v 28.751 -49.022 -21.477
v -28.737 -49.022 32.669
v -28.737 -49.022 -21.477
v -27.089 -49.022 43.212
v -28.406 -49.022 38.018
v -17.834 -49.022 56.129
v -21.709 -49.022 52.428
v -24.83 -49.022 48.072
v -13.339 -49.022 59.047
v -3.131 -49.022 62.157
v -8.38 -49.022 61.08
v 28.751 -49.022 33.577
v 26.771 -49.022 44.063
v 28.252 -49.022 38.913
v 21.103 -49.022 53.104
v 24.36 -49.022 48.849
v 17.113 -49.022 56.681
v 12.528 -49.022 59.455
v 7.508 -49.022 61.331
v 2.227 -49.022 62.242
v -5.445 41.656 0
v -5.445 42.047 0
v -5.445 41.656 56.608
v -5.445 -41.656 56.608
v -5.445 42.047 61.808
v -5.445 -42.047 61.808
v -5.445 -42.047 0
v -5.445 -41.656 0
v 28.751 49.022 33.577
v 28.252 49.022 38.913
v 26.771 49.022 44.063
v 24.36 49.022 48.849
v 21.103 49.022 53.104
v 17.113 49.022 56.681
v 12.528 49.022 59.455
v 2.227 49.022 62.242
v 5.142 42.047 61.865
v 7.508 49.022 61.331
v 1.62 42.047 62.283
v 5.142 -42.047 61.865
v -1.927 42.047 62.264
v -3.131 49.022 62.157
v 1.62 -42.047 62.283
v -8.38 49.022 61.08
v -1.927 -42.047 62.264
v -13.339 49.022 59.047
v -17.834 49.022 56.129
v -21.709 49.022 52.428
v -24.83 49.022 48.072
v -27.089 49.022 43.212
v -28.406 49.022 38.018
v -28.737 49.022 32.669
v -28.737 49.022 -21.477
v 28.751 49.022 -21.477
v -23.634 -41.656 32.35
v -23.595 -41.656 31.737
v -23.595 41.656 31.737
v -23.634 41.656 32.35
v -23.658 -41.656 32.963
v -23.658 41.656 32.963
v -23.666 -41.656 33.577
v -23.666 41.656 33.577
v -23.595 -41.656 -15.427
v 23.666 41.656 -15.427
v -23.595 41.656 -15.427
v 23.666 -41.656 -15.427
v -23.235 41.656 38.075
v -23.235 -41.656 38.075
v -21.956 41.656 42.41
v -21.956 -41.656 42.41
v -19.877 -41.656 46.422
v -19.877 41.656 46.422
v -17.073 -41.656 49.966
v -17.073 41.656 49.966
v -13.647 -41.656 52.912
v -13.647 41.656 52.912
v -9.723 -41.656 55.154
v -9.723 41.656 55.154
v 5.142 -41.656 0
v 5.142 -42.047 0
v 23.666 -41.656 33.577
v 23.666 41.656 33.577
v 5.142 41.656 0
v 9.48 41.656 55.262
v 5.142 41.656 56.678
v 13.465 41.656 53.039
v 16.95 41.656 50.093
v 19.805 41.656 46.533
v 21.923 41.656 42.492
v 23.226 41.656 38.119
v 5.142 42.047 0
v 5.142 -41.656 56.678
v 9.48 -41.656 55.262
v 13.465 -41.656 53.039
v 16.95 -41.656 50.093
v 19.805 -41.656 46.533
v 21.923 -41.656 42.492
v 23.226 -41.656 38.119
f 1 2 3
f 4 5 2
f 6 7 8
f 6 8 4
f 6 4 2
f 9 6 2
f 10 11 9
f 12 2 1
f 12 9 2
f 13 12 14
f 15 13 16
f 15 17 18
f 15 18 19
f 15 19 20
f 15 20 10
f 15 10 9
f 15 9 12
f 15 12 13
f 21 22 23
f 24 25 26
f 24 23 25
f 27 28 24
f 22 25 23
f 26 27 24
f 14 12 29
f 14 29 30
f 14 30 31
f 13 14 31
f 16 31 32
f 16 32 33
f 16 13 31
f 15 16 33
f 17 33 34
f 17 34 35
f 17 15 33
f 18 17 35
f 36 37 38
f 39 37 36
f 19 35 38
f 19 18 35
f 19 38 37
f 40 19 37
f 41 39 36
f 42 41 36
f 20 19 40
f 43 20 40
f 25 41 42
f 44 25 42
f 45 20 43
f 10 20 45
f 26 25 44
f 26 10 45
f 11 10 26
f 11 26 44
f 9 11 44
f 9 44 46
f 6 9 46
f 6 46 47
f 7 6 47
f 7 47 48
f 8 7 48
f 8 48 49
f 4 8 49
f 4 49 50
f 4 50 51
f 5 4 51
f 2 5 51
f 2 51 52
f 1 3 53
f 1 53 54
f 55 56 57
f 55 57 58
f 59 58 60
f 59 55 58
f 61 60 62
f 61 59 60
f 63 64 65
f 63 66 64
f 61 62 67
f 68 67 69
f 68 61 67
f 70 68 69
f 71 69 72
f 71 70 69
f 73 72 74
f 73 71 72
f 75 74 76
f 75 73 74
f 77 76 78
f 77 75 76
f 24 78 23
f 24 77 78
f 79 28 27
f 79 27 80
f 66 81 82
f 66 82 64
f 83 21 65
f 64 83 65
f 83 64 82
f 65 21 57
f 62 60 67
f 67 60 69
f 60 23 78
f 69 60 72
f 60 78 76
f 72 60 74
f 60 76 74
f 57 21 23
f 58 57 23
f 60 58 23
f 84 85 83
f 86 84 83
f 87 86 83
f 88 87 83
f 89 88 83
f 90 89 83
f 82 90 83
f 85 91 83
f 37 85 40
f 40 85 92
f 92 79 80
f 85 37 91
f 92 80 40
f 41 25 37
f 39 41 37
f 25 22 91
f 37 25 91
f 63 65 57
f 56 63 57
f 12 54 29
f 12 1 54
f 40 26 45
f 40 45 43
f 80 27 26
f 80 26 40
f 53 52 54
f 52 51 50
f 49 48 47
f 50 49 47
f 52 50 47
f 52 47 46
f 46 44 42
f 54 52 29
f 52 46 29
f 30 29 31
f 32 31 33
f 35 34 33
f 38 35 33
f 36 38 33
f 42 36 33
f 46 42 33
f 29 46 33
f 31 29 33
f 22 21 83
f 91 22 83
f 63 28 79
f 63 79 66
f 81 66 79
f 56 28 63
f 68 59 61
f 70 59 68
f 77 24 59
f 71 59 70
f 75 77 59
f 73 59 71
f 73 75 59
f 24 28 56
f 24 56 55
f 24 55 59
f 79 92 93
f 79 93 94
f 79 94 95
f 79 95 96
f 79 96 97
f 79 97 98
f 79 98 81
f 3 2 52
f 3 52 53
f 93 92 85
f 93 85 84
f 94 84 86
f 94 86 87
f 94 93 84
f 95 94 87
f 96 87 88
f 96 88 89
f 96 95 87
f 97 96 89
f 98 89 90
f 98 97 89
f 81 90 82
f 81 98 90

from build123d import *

# Parameters (mm, degrees)
F1_DEPTH = 49.022
F3_DEPTH = 41.656
F4_W     = 10.587335
F4_H     = 42.046845
F5_DEPTH = 108.712


with BuildPart() as f1:
    # F0 (on Front) → F1 (new body)
    with BuildSketch(Plane.XZ):
        with BuildLine():
            Line((-28.737051, 33.576977), (28.751377, 33.576977))
            ThreePointArc((28.751377, 33.576977), (-0.453801, 62.324772), (-28.737051, 32.669488))
            Line((-28.737051, 32.669488), (-28.737051, 33.576977))
        make_face()
        with BuildLine():
            ThreePointArc((-28.737051, 32.669488), (0.453801, 4.829181), (28.751377, 33.576977))
            Line((28.751377, 33.576977), (-28.737051, 33.576977))
            Line((-28.737051, 33.576977), (-28.737051, 32.669488))
        make_face()
        with BuildLine():
            Line((28.751377, -21.477165), (28.751377, 33.576977))
            ThreePointArc((28.751377, 33.576977), (0.453801, 4.829181), (-28.737051, 32.669488))
            Line((-28.737051, 32.669488), (-28.737051, -21.477165))
            Line((-28.737051, -21.477165), (28.751377, -21.477165))
        make_face()
    extrude(amount=F1_DEPTH)

    # F2 (on face) → F3 (cut)
    with BuildSketch(Plane(origin=(0, 0, 0), x_dir=(-1, 0, 0), z_dir=(0, 1, 0))):
        with BuildLine():
            ThreePointArc((23.594631, 31.736941), (23.648353, 32.656262), (23.66627, 33.576977))
            ThreePointArc((23.66627, 33.576977), (0, 57.243247), (-23.66627, 33.576977))
            Line((-23.66627, 33.576977), (23.594631, 33.576977))
            Line((23.594631, 33.576977), (23.594631, 31.736941))
        make_face()
        with BuildLine():
            Line((23.594631, 33.576977), (-23.66627, 33.576977))
            ThreePointArc((-23.66627, 33.576977), (-0.920715, 9.928623), (23.594631, 31.736941))
            Line((23.594631, 31.736941), (23.594631, 33.576977))
        make_face()
        with BuildLine():
            ThreePointArc((23.594631, 31.736941), (-0.920715, 9.928623), (-23.66627, 33.576977))
            Line((-23.66627, 33.576977), (-23.66627, -15.427259))
            Line((-23.66627, -15.427259), (23.594631, -15.427259))
            Line((23.594631, -15.427259), (23.594631, 31.736941))
        make_face()
    extrude(amount=-F3_DEPTH, mode=Mode.SUBTRACT)

    # F4 (on Top) → F5 (cut)
    with BuildSketch(Plane.XY):
        with Locations((-0.151248, -21.023422)):
            Rectangle(F4_W, F4_H)
    extrude(amount=F5_DEPTH, mode=Mode.SUBTRACT)

    # F6: F1 across plane


with BuildPart() as f1_1:
    add(f1.part)
    add(f1.part.mirror(Plane.XZ))


solid = f1_1.part
